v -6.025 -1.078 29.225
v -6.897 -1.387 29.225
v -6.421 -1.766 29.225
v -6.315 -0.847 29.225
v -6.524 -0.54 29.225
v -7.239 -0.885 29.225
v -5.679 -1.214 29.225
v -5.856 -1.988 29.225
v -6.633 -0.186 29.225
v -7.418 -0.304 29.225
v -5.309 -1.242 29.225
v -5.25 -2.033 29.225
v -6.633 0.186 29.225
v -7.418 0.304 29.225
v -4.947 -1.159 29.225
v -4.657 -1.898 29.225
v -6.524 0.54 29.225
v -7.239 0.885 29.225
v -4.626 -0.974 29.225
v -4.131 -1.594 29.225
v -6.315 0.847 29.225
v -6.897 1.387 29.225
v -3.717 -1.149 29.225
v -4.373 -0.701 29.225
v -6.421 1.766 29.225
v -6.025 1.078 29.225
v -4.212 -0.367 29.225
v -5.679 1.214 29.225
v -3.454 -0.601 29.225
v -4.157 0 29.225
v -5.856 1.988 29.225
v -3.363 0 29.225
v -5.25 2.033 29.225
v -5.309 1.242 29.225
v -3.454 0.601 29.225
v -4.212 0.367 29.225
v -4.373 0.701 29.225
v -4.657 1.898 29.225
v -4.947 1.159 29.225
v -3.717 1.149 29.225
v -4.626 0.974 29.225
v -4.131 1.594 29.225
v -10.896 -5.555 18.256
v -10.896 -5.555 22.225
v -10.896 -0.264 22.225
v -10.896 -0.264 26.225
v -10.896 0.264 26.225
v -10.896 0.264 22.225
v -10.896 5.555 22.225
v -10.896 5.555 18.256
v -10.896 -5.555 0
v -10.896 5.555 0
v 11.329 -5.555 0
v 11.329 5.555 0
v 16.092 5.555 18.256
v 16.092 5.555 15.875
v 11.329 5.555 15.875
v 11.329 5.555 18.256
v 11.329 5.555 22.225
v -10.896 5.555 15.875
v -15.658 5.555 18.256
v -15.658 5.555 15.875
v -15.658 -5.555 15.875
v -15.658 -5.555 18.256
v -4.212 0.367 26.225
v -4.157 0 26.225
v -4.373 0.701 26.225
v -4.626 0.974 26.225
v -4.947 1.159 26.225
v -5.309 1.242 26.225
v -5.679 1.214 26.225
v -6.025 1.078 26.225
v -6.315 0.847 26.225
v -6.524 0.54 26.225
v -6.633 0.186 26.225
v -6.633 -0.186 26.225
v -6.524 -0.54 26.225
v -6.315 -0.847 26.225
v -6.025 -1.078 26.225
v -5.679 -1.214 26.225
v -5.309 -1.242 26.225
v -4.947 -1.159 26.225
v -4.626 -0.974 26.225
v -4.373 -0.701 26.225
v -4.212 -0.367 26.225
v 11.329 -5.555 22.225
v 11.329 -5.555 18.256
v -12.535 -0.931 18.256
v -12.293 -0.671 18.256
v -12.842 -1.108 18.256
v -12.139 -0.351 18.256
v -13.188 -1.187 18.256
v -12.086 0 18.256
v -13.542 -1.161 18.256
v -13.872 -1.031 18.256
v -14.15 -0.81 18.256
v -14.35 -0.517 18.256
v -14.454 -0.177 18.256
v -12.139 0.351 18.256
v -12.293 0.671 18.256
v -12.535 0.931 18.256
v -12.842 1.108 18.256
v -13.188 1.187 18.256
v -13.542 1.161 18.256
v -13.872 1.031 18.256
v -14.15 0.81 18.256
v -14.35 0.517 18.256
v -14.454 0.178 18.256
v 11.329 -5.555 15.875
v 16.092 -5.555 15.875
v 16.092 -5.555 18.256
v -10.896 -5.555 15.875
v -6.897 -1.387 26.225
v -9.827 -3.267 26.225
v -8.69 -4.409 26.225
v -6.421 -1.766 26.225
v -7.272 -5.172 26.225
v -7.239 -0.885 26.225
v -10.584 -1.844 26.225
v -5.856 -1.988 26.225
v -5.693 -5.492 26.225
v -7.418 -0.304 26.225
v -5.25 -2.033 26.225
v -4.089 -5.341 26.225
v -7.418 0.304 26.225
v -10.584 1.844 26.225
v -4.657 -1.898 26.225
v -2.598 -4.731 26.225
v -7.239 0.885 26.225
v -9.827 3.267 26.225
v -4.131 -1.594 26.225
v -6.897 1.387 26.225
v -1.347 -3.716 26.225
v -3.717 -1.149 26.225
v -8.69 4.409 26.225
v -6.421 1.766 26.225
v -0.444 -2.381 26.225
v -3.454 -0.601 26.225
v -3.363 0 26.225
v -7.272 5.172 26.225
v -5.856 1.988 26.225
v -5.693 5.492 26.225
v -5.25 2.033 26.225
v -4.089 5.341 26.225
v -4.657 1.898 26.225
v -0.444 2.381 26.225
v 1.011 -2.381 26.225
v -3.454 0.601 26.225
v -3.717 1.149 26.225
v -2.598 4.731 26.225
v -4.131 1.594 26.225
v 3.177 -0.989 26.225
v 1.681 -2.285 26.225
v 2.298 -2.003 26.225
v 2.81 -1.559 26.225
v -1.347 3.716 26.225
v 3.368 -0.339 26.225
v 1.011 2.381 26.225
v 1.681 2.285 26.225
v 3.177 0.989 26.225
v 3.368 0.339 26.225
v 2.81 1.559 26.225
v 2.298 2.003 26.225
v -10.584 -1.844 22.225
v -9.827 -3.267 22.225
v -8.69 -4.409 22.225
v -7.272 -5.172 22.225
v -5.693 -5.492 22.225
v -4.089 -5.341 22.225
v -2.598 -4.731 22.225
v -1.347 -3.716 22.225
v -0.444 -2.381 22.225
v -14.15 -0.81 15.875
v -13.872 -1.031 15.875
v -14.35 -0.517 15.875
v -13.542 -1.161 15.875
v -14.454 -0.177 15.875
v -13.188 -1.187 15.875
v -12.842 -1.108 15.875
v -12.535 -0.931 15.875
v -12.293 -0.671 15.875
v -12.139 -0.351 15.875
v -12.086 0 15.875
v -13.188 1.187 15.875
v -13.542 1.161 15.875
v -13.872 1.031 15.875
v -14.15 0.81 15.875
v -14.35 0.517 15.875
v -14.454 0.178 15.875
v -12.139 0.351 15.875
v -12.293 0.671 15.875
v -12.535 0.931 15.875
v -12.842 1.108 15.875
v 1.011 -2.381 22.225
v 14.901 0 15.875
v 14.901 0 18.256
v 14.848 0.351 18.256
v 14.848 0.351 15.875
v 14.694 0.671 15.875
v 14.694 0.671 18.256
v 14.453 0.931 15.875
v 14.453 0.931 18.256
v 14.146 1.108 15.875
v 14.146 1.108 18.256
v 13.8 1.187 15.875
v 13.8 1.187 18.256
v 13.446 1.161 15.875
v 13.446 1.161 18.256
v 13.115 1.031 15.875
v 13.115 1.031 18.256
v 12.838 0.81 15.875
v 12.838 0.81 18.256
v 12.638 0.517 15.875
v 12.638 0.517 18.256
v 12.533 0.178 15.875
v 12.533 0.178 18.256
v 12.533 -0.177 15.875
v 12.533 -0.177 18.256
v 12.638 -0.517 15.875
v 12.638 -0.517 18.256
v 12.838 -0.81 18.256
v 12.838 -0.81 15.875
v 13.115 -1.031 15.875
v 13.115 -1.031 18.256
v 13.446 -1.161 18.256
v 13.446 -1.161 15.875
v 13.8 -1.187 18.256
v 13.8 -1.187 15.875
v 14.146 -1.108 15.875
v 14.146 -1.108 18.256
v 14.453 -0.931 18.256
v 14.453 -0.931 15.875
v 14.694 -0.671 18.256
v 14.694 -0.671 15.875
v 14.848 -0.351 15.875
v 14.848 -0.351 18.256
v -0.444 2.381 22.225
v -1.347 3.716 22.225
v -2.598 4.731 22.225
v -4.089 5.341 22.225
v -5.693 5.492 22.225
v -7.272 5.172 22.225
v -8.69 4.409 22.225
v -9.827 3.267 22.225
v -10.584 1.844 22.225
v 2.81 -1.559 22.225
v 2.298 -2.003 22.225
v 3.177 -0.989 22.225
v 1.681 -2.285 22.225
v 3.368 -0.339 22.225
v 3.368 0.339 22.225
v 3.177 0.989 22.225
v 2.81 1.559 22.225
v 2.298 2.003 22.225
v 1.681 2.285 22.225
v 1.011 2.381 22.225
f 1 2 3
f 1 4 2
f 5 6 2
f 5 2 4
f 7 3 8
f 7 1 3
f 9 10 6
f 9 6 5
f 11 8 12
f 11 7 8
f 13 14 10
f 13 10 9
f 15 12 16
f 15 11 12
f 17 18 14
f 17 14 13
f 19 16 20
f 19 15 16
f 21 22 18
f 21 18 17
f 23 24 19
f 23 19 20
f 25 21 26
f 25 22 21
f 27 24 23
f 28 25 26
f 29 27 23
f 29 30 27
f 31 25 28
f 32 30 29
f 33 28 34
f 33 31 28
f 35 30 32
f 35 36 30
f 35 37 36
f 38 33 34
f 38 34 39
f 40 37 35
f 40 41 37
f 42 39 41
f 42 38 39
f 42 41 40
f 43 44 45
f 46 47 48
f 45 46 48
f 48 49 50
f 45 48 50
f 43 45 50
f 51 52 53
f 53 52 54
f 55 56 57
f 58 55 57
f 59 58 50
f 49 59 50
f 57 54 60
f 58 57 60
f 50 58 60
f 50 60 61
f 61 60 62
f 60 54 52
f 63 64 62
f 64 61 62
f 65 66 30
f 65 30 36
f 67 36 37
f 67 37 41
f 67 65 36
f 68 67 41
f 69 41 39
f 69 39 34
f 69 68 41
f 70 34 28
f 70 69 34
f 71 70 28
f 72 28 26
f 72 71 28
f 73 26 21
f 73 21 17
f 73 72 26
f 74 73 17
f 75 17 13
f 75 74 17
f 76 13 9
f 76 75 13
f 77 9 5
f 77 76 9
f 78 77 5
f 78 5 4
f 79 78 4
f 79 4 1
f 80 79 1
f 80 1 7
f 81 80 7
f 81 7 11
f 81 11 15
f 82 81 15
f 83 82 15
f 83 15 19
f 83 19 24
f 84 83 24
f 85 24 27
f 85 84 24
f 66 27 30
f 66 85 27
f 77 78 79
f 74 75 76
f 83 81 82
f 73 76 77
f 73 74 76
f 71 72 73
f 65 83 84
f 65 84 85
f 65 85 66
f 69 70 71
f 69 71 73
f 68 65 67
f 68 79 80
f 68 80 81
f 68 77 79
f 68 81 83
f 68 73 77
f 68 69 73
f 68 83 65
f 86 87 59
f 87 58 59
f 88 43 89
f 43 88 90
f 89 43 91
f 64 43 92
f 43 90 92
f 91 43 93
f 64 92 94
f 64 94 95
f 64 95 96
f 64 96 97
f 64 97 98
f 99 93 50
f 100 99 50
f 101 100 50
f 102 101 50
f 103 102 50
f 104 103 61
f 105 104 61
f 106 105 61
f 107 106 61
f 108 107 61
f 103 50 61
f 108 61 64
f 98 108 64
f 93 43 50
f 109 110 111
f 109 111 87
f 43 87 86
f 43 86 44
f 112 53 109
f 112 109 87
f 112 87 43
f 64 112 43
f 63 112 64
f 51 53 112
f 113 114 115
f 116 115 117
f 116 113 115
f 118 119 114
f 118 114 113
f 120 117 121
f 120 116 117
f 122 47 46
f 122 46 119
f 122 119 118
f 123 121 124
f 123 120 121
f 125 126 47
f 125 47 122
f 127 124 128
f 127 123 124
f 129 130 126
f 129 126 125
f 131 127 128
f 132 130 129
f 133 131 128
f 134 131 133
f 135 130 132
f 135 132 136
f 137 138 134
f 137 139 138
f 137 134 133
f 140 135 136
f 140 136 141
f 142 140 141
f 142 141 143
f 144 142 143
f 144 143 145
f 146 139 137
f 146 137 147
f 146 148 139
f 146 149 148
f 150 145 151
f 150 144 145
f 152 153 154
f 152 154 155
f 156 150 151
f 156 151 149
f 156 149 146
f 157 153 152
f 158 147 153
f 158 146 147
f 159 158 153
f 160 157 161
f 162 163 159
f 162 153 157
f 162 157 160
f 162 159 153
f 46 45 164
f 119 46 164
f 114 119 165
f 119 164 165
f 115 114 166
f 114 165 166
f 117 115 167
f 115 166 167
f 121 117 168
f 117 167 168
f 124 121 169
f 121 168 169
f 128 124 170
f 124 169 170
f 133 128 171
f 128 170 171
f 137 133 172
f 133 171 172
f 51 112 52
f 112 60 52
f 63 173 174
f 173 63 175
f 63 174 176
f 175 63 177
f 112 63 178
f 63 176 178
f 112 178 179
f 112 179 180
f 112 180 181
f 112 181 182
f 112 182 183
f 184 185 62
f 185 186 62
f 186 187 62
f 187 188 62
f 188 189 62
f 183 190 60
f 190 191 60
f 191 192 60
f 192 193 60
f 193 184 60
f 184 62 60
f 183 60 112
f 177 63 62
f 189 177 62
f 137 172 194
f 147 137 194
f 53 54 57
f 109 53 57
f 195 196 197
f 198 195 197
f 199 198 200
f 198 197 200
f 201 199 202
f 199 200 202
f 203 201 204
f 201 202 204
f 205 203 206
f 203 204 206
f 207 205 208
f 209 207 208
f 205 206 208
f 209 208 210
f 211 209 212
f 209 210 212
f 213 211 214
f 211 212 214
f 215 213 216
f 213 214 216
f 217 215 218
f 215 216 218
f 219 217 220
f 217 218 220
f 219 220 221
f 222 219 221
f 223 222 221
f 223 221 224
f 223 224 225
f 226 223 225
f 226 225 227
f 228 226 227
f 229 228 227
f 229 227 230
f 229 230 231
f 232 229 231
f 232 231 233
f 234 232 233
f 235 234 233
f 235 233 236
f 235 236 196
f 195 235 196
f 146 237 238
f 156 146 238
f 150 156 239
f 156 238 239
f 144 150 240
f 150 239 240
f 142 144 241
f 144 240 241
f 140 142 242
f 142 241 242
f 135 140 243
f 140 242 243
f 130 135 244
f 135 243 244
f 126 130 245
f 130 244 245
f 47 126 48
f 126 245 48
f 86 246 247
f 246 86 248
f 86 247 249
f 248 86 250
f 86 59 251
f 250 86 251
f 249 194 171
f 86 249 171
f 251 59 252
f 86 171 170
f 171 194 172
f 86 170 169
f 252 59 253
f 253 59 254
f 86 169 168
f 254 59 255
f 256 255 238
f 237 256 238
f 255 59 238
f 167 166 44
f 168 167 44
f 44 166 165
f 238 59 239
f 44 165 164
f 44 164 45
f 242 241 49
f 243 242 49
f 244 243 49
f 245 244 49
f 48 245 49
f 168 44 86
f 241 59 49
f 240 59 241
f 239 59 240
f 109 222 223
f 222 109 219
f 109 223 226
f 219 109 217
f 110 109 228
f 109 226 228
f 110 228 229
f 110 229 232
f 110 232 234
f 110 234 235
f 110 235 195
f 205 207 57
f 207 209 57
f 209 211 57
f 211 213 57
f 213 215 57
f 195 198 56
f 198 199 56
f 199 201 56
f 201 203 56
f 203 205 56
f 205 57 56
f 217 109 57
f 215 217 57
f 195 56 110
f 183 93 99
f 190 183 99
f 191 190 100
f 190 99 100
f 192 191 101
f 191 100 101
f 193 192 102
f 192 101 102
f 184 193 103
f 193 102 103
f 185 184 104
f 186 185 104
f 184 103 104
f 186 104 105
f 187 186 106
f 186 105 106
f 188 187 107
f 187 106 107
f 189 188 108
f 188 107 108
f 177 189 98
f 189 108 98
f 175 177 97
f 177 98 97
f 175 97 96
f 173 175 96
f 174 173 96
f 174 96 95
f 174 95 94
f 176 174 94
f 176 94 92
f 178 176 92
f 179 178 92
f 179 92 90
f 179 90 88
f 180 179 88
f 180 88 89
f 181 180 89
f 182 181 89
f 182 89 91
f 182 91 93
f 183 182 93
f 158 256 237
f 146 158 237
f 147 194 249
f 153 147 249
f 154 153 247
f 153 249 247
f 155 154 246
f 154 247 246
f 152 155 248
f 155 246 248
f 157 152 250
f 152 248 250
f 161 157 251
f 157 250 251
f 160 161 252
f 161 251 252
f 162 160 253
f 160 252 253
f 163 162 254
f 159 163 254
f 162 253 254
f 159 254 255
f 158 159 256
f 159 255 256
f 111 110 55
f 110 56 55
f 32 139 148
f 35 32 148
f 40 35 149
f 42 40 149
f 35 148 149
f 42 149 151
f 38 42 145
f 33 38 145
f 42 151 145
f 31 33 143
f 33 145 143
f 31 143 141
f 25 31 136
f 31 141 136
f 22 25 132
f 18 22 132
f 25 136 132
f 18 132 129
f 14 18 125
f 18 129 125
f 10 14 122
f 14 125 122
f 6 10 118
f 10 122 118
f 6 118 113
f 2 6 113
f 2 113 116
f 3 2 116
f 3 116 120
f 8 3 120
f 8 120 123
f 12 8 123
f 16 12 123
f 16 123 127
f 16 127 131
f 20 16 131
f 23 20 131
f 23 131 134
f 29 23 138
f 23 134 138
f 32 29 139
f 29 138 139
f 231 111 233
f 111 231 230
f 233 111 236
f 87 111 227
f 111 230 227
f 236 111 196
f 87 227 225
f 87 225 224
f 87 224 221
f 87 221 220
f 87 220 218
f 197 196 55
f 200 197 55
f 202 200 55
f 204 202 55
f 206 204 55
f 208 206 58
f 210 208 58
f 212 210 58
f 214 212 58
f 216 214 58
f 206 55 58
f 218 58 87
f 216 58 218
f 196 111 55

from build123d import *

# Parameters (mm, degrees)
P_IDAT_VYSUNUT_M1_DEPTH  = 5.555
P_IDAT_VYSUNUT_M2_DEPTH  = 4
SKICA3_R                 = 2.03883748
SKICA3_R_2               = 1.24519559
P_IDAT_VYSUNUT_M3_DEPTH  = 3
SKICA5_R                 = 1.190602913
SKICA5_R_2               = 1.19060243
ODEBRAT_VYSUNUT_M1_DEPTH = 23


# Read off the part's stored shape, not the designer's step: Přidat vysunutím2
with BuildPart() as part:
    # Skica1 → Přidat vysunutím1 (new, symmetric)
    with BuildSketch(Plane(origin=(0, 0, 0), x_dir=(1, 0, 0), z_dir=(0, 1, 0))):
        Polygon((11.32935, -15.875), (16.09185, -15.875), (16.09185, -18.25625), (11.32935, -18.25625), (11.32935, -22.225), (-10.89565, -22.225), (-10.89565, -18.25625), (-15.65815, -18.25625), (-15.65815, -15.875), (-10.89565, -15.875), (-10.89565, 0), (11.32935, 0), align=None)
    extrude(amount=P_IDAT_VYSUNUT_M1_DEPTH, both=True)

    # Přidat vysunutím2 outline → Přidat vysunutím2 (add)
    with BuildSketch(Plane.XY.offset(22.225)):
        with BuildLine():
            Line((-10.89565, 0.263816958), (-10.89565, -0.263816958))
            ThreePointArc((-10.89565, -0.263816958), (-6.494080203, -5.390484118), (-0.444197365, -2.381256561))
            Line((-0.444197365, -2.381256561), (1.010536018, -2.381256561))
            ThreePointArc((1.010536018, -2.381256561), (3.391829299, 2.729e-06), (1.010604, 2.38133))
            Line((1.010604, 2.38133), (-0.444232639, 2.38133))
            ThreePointArc((-0.444232639, 2.38133), (-6.494120128, 5.390476029), (-10.89565, 0.263816958))
        make_face()
    extrude(amount=P_IDAT_VYSUNUT_M2_DEPTH)

    # Skica3 → Přidat vysunutím3 (add)
    with BuildSketch(Plane.XY.offset(26.225)):
        with Locations((-5.401980861, 0)):
            Circle(SKICA3_R)
        with Locations((-5.401980861, 0)):
            Circle(SKICA3_R_2, mode=Mode.SUBTRACT)
    extrude(amount=P_IDAT_VYSUNUT_M3_DEPTH)

    # Skica5 → Odebrat vysunutím1 (cut)
    with BuildSketch(Plane.XY.offset(18.25625)):
        with Locations((-13.276937552, 5.8558e-05)):
            Circle(SKICA5_R)
        with Locations((13.71053658, 6.1415e-05)):
            Circle(SKICA5_R_2)
    extrude(amount=-ODEBRAT_VYSUNUT_M1_DEPTH, mode=Mode.SUBTRACT)


solid = part.part
